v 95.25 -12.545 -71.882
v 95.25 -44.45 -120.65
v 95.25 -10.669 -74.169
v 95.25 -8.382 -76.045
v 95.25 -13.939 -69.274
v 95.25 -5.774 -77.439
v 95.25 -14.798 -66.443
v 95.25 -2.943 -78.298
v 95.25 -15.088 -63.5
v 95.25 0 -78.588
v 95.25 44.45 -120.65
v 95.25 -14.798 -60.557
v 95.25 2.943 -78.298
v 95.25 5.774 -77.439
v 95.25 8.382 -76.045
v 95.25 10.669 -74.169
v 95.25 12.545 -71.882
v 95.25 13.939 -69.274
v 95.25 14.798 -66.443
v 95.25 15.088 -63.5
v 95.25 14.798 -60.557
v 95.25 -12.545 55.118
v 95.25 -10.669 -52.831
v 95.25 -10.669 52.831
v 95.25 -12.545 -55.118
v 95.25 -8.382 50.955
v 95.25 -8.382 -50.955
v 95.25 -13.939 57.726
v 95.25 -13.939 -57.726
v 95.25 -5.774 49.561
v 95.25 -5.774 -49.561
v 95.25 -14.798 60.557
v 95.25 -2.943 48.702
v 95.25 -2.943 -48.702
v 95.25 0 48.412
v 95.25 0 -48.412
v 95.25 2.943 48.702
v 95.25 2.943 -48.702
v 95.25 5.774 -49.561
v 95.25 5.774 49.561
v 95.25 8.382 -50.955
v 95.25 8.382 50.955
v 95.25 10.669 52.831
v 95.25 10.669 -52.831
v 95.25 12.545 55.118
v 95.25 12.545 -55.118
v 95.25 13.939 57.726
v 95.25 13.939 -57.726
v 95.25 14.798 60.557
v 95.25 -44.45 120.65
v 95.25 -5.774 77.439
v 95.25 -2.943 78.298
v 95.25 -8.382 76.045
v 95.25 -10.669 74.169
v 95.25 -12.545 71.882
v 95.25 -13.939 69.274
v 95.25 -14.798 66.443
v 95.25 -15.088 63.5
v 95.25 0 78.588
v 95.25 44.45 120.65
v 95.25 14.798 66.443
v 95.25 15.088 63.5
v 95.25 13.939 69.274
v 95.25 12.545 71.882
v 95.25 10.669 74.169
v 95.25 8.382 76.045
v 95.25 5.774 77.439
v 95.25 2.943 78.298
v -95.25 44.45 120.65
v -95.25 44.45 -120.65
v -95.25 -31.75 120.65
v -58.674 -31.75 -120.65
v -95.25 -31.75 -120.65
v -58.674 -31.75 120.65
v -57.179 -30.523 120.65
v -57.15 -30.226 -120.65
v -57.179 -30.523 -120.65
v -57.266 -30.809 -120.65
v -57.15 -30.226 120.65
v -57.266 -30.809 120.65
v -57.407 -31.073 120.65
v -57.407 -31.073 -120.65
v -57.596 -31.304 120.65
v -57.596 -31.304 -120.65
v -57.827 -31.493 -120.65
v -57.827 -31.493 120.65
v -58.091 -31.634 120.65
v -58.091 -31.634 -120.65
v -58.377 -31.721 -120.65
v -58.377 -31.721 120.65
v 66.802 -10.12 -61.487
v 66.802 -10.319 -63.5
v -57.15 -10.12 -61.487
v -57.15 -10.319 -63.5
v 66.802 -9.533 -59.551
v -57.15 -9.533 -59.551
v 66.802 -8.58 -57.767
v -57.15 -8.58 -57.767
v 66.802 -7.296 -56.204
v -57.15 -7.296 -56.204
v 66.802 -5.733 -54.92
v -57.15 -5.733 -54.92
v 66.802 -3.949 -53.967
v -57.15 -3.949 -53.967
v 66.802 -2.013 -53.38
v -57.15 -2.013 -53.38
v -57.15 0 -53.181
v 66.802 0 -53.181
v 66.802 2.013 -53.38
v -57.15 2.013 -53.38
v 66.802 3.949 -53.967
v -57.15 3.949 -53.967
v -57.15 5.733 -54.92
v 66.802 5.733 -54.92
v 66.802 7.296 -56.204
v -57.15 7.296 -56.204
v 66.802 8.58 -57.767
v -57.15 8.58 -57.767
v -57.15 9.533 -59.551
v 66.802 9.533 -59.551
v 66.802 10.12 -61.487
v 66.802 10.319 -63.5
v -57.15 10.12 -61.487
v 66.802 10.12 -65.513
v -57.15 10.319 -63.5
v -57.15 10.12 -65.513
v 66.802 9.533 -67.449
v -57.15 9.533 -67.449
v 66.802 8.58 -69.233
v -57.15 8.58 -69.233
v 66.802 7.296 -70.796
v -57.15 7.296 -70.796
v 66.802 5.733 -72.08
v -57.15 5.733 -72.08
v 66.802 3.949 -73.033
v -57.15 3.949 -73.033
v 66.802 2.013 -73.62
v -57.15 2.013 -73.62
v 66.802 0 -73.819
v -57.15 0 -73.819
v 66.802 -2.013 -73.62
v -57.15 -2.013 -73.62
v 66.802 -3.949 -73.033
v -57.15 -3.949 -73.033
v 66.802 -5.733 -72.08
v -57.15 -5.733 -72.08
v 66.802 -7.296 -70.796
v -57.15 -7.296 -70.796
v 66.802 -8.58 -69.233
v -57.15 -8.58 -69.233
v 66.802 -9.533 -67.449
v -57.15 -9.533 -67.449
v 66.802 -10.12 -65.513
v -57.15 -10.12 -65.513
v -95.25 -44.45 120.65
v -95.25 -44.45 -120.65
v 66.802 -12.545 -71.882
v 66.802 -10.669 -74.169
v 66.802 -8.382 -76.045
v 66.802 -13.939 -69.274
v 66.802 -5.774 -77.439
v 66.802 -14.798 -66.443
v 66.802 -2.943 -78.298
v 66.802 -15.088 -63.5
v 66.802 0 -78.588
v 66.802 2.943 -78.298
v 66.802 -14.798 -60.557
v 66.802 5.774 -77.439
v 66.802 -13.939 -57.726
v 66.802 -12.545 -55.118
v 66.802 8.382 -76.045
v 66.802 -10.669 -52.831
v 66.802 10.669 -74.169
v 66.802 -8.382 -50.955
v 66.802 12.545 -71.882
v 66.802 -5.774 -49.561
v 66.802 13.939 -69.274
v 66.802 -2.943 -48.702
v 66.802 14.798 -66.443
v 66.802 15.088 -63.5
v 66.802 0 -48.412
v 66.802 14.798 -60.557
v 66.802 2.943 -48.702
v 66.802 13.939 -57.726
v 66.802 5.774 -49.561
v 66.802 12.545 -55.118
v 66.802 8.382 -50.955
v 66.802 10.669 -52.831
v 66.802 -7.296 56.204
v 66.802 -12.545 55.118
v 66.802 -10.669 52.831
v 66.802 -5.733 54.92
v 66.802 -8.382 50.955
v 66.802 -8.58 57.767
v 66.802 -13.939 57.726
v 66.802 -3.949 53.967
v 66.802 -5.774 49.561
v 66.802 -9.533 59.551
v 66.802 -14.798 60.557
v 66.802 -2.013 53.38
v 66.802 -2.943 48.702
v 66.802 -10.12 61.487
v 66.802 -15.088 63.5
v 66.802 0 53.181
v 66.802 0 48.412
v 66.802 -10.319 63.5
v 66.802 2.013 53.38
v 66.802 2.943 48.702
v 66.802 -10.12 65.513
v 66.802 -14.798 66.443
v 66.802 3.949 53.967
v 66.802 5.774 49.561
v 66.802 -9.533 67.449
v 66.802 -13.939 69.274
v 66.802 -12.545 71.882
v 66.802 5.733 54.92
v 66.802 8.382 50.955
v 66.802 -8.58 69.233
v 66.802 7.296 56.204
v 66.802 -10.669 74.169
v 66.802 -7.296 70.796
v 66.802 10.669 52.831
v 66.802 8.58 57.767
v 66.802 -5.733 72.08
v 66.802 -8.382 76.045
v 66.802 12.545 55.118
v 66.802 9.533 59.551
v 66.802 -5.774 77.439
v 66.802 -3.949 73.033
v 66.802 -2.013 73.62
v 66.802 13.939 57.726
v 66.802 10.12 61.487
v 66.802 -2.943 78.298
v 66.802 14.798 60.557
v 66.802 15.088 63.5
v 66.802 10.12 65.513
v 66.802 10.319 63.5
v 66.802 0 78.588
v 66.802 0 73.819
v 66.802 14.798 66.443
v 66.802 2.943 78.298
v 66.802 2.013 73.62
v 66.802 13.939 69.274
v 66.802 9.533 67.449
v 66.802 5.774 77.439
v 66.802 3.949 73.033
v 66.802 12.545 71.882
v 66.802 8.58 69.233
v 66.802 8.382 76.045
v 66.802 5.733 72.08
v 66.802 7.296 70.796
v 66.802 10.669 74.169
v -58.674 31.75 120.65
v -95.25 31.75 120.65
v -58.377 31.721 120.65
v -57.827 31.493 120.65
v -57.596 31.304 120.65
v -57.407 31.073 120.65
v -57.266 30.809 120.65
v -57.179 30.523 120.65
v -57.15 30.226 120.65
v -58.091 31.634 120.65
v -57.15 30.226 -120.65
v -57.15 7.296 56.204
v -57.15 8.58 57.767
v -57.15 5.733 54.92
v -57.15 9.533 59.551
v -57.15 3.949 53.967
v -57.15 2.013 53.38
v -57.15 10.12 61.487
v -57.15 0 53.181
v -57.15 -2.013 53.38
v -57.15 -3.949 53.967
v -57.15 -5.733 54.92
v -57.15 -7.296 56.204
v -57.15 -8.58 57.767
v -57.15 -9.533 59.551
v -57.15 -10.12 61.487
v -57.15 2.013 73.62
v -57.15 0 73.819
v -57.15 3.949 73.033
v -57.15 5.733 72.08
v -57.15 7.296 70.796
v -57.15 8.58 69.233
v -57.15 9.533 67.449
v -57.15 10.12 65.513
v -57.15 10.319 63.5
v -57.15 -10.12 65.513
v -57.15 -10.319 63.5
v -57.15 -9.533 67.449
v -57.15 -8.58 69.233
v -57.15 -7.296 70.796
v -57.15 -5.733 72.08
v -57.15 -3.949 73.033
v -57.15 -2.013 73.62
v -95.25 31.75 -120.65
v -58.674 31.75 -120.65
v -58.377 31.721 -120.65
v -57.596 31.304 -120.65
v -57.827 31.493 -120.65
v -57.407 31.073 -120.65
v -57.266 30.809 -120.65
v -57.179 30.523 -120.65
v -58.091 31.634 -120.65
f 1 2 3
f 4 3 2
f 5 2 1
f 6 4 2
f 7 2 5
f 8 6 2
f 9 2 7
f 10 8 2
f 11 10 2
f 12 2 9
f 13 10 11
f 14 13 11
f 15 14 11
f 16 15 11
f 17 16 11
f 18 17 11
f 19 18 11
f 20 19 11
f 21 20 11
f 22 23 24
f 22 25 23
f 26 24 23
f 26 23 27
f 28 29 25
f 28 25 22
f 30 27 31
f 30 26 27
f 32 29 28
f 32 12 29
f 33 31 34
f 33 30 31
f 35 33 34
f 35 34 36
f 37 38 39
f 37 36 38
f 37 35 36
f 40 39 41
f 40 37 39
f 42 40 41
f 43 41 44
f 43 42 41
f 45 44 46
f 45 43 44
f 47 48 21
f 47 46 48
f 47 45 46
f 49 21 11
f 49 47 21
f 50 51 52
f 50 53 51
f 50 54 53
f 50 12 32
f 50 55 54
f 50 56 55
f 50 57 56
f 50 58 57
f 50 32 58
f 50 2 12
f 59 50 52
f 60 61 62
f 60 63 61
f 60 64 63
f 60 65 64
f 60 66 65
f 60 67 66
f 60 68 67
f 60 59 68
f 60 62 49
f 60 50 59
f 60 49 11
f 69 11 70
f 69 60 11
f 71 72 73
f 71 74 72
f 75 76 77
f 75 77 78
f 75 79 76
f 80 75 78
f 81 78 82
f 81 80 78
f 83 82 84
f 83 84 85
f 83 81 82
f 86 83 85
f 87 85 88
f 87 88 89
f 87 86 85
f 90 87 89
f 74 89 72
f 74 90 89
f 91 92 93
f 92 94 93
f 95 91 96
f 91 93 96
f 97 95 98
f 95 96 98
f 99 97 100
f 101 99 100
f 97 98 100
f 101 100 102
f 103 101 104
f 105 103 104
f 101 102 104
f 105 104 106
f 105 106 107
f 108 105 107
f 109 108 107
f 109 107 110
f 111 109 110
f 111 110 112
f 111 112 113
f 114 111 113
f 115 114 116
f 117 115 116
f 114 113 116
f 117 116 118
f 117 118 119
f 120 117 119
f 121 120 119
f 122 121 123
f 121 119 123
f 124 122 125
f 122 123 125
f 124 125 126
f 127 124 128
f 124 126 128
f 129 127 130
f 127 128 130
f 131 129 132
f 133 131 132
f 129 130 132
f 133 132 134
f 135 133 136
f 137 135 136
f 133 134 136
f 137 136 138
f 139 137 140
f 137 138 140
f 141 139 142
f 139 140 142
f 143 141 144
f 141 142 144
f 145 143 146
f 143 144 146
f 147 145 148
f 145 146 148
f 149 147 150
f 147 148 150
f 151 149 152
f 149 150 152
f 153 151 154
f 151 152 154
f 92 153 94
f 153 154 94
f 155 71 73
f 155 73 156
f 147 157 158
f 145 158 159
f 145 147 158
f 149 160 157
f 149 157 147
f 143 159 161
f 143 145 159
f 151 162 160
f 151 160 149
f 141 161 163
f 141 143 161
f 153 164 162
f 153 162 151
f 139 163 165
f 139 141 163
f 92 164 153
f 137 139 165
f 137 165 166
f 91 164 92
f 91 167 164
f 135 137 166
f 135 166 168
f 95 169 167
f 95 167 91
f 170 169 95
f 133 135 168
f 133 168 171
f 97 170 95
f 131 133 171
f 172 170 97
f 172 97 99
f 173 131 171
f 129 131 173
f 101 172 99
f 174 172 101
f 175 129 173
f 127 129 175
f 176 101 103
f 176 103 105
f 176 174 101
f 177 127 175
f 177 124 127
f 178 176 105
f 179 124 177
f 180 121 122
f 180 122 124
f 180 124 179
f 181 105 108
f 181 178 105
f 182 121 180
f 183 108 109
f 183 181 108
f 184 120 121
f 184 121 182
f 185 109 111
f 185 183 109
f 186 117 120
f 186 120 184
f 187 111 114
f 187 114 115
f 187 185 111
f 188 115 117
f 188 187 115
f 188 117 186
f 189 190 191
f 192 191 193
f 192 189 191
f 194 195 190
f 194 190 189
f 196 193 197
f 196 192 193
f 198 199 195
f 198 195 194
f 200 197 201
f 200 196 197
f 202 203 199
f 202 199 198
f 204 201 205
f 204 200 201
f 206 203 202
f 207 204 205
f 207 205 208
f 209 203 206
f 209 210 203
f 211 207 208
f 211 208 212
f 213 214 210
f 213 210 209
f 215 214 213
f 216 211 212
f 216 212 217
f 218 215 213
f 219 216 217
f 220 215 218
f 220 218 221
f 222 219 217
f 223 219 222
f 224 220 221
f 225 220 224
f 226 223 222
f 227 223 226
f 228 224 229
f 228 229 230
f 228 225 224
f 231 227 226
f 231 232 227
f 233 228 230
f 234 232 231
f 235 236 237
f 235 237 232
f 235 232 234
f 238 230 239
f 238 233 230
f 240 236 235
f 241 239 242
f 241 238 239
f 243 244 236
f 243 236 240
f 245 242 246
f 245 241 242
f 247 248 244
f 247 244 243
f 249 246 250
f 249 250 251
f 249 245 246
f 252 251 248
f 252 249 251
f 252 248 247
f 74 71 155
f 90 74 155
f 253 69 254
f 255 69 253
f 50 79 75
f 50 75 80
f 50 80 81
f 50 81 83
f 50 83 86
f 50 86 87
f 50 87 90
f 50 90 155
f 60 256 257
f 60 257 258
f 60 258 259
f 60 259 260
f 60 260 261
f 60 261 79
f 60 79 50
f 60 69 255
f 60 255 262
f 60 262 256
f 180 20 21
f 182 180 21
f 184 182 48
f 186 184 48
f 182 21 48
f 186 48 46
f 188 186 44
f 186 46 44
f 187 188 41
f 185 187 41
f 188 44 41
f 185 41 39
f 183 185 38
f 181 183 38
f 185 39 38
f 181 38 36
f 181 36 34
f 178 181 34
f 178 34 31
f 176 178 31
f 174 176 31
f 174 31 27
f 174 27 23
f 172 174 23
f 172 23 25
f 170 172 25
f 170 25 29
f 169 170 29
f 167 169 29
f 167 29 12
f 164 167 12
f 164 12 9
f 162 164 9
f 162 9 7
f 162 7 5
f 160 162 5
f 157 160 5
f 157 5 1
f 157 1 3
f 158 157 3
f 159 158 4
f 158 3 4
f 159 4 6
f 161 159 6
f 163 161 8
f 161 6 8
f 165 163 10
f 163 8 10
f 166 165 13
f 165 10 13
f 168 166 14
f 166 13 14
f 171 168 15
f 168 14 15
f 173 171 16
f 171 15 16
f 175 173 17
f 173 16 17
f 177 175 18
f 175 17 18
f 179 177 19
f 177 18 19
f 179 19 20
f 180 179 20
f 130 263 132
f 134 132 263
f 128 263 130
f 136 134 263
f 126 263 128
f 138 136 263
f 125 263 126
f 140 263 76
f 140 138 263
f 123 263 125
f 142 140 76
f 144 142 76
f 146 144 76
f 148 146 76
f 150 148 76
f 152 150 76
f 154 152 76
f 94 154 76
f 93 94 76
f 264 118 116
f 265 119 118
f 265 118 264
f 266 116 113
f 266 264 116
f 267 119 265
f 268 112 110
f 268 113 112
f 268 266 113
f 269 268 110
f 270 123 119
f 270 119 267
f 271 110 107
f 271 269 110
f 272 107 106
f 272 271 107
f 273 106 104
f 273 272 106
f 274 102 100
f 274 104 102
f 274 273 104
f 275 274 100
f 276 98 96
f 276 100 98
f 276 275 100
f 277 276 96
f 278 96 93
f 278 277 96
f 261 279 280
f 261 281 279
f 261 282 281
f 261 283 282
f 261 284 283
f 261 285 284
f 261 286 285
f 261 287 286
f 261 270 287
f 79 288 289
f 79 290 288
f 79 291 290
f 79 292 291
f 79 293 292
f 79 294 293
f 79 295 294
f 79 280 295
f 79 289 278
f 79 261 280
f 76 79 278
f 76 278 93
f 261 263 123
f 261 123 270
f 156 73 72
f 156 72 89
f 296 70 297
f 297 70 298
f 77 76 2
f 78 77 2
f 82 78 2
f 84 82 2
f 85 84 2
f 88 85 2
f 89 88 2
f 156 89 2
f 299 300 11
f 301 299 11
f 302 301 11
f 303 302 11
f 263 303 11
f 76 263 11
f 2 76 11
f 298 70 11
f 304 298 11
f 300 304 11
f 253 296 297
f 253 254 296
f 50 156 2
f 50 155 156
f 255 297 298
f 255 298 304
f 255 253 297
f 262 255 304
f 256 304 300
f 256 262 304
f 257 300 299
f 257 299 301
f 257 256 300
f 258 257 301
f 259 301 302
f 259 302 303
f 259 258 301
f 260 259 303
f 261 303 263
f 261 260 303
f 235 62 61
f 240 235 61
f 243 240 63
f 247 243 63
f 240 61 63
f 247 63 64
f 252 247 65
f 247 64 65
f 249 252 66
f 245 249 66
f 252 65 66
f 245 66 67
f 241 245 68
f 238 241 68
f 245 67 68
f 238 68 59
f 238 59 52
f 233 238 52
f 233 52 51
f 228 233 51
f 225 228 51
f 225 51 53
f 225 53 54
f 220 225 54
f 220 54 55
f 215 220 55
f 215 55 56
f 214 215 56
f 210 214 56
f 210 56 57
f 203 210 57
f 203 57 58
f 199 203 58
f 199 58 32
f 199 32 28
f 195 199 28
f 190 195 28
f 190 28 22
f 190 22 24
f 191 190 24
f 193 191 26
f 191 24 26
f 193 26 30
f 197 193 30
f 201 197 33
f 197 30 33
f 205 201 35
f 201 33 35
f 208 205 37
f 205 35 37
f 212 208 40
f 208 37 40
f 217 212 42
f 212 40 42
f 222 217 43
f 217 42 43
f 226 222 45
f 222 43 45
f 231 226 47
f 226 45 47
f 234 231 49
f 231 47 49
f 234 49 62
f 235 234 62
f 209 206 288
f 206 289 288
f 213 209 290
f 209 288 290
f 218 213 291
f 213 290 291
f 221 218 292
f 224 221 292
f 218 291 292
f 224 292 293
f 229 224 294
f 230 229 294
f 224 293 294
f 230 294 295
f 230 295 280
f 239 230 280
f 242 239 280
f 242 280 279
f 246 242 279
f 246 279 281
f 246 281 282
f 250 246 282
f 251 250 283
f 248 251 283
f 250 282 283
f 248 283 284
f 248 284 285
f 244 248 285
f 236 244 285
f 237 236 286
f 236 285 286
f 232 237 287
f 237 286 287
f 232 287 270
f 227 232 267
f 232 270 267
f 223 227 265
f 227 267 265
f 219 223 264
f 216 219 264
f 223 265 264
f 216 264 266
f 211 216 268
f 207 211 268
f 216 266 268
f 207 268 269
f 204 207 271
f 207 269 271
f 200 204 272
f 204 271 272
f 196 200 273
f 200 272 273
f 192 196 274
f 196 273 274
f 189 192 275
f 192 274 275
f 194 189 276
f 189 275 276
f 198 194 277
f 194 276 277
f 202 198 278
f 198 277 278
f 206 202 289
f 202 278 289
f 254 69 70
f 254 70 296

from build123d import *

# Parameters (mm, degrees)
F1_DEPTH       = 120.65
F3_D           = 20.6375
F3_CBORE_D     = 30.1752
F3_CBORE_DEPTH = 28.448
F4_R           = 1.524


# Not quite as in the source:
# - a length typed as a fraction of an inch, garbled in the dataset ("3 / 203.2 mm" for 3/8 in), is restored


with BuildPart() as f1:
    # F0 (on Top) → F1 (new body, symmetric)
    with BuildSketch(Plane.XY):
        Polygon((95.25, 44.45), (-95.25, 44.45), (-95.25, 31.75), (-57.15, 31.75), (-57.15, -31.75), (-95.25, -31.75), (-95.25, -44.45), (95.25, -44.45), align=None)
    extrude(amount=F1_DEPTH, both=True)

    # F3 (through all)
    with Locations(Plane.YZ.offset(95.25)):
        with Locations((0, 63.5), (0, -63.5)):
            CounterBoreHole(F3_D / 2, F3_CBORE_D / 2, F3_CBORE_DEPTH)

    # F4
    f4_edges = [f1.edges().sort_by_distance(p)[0] for p in [
        (-57.15, -31.75, 0),
        (-57.15, 31.75, 0),
    ]]
    fillet(f4_edges, radius=F4_R)


solid = f1.part
